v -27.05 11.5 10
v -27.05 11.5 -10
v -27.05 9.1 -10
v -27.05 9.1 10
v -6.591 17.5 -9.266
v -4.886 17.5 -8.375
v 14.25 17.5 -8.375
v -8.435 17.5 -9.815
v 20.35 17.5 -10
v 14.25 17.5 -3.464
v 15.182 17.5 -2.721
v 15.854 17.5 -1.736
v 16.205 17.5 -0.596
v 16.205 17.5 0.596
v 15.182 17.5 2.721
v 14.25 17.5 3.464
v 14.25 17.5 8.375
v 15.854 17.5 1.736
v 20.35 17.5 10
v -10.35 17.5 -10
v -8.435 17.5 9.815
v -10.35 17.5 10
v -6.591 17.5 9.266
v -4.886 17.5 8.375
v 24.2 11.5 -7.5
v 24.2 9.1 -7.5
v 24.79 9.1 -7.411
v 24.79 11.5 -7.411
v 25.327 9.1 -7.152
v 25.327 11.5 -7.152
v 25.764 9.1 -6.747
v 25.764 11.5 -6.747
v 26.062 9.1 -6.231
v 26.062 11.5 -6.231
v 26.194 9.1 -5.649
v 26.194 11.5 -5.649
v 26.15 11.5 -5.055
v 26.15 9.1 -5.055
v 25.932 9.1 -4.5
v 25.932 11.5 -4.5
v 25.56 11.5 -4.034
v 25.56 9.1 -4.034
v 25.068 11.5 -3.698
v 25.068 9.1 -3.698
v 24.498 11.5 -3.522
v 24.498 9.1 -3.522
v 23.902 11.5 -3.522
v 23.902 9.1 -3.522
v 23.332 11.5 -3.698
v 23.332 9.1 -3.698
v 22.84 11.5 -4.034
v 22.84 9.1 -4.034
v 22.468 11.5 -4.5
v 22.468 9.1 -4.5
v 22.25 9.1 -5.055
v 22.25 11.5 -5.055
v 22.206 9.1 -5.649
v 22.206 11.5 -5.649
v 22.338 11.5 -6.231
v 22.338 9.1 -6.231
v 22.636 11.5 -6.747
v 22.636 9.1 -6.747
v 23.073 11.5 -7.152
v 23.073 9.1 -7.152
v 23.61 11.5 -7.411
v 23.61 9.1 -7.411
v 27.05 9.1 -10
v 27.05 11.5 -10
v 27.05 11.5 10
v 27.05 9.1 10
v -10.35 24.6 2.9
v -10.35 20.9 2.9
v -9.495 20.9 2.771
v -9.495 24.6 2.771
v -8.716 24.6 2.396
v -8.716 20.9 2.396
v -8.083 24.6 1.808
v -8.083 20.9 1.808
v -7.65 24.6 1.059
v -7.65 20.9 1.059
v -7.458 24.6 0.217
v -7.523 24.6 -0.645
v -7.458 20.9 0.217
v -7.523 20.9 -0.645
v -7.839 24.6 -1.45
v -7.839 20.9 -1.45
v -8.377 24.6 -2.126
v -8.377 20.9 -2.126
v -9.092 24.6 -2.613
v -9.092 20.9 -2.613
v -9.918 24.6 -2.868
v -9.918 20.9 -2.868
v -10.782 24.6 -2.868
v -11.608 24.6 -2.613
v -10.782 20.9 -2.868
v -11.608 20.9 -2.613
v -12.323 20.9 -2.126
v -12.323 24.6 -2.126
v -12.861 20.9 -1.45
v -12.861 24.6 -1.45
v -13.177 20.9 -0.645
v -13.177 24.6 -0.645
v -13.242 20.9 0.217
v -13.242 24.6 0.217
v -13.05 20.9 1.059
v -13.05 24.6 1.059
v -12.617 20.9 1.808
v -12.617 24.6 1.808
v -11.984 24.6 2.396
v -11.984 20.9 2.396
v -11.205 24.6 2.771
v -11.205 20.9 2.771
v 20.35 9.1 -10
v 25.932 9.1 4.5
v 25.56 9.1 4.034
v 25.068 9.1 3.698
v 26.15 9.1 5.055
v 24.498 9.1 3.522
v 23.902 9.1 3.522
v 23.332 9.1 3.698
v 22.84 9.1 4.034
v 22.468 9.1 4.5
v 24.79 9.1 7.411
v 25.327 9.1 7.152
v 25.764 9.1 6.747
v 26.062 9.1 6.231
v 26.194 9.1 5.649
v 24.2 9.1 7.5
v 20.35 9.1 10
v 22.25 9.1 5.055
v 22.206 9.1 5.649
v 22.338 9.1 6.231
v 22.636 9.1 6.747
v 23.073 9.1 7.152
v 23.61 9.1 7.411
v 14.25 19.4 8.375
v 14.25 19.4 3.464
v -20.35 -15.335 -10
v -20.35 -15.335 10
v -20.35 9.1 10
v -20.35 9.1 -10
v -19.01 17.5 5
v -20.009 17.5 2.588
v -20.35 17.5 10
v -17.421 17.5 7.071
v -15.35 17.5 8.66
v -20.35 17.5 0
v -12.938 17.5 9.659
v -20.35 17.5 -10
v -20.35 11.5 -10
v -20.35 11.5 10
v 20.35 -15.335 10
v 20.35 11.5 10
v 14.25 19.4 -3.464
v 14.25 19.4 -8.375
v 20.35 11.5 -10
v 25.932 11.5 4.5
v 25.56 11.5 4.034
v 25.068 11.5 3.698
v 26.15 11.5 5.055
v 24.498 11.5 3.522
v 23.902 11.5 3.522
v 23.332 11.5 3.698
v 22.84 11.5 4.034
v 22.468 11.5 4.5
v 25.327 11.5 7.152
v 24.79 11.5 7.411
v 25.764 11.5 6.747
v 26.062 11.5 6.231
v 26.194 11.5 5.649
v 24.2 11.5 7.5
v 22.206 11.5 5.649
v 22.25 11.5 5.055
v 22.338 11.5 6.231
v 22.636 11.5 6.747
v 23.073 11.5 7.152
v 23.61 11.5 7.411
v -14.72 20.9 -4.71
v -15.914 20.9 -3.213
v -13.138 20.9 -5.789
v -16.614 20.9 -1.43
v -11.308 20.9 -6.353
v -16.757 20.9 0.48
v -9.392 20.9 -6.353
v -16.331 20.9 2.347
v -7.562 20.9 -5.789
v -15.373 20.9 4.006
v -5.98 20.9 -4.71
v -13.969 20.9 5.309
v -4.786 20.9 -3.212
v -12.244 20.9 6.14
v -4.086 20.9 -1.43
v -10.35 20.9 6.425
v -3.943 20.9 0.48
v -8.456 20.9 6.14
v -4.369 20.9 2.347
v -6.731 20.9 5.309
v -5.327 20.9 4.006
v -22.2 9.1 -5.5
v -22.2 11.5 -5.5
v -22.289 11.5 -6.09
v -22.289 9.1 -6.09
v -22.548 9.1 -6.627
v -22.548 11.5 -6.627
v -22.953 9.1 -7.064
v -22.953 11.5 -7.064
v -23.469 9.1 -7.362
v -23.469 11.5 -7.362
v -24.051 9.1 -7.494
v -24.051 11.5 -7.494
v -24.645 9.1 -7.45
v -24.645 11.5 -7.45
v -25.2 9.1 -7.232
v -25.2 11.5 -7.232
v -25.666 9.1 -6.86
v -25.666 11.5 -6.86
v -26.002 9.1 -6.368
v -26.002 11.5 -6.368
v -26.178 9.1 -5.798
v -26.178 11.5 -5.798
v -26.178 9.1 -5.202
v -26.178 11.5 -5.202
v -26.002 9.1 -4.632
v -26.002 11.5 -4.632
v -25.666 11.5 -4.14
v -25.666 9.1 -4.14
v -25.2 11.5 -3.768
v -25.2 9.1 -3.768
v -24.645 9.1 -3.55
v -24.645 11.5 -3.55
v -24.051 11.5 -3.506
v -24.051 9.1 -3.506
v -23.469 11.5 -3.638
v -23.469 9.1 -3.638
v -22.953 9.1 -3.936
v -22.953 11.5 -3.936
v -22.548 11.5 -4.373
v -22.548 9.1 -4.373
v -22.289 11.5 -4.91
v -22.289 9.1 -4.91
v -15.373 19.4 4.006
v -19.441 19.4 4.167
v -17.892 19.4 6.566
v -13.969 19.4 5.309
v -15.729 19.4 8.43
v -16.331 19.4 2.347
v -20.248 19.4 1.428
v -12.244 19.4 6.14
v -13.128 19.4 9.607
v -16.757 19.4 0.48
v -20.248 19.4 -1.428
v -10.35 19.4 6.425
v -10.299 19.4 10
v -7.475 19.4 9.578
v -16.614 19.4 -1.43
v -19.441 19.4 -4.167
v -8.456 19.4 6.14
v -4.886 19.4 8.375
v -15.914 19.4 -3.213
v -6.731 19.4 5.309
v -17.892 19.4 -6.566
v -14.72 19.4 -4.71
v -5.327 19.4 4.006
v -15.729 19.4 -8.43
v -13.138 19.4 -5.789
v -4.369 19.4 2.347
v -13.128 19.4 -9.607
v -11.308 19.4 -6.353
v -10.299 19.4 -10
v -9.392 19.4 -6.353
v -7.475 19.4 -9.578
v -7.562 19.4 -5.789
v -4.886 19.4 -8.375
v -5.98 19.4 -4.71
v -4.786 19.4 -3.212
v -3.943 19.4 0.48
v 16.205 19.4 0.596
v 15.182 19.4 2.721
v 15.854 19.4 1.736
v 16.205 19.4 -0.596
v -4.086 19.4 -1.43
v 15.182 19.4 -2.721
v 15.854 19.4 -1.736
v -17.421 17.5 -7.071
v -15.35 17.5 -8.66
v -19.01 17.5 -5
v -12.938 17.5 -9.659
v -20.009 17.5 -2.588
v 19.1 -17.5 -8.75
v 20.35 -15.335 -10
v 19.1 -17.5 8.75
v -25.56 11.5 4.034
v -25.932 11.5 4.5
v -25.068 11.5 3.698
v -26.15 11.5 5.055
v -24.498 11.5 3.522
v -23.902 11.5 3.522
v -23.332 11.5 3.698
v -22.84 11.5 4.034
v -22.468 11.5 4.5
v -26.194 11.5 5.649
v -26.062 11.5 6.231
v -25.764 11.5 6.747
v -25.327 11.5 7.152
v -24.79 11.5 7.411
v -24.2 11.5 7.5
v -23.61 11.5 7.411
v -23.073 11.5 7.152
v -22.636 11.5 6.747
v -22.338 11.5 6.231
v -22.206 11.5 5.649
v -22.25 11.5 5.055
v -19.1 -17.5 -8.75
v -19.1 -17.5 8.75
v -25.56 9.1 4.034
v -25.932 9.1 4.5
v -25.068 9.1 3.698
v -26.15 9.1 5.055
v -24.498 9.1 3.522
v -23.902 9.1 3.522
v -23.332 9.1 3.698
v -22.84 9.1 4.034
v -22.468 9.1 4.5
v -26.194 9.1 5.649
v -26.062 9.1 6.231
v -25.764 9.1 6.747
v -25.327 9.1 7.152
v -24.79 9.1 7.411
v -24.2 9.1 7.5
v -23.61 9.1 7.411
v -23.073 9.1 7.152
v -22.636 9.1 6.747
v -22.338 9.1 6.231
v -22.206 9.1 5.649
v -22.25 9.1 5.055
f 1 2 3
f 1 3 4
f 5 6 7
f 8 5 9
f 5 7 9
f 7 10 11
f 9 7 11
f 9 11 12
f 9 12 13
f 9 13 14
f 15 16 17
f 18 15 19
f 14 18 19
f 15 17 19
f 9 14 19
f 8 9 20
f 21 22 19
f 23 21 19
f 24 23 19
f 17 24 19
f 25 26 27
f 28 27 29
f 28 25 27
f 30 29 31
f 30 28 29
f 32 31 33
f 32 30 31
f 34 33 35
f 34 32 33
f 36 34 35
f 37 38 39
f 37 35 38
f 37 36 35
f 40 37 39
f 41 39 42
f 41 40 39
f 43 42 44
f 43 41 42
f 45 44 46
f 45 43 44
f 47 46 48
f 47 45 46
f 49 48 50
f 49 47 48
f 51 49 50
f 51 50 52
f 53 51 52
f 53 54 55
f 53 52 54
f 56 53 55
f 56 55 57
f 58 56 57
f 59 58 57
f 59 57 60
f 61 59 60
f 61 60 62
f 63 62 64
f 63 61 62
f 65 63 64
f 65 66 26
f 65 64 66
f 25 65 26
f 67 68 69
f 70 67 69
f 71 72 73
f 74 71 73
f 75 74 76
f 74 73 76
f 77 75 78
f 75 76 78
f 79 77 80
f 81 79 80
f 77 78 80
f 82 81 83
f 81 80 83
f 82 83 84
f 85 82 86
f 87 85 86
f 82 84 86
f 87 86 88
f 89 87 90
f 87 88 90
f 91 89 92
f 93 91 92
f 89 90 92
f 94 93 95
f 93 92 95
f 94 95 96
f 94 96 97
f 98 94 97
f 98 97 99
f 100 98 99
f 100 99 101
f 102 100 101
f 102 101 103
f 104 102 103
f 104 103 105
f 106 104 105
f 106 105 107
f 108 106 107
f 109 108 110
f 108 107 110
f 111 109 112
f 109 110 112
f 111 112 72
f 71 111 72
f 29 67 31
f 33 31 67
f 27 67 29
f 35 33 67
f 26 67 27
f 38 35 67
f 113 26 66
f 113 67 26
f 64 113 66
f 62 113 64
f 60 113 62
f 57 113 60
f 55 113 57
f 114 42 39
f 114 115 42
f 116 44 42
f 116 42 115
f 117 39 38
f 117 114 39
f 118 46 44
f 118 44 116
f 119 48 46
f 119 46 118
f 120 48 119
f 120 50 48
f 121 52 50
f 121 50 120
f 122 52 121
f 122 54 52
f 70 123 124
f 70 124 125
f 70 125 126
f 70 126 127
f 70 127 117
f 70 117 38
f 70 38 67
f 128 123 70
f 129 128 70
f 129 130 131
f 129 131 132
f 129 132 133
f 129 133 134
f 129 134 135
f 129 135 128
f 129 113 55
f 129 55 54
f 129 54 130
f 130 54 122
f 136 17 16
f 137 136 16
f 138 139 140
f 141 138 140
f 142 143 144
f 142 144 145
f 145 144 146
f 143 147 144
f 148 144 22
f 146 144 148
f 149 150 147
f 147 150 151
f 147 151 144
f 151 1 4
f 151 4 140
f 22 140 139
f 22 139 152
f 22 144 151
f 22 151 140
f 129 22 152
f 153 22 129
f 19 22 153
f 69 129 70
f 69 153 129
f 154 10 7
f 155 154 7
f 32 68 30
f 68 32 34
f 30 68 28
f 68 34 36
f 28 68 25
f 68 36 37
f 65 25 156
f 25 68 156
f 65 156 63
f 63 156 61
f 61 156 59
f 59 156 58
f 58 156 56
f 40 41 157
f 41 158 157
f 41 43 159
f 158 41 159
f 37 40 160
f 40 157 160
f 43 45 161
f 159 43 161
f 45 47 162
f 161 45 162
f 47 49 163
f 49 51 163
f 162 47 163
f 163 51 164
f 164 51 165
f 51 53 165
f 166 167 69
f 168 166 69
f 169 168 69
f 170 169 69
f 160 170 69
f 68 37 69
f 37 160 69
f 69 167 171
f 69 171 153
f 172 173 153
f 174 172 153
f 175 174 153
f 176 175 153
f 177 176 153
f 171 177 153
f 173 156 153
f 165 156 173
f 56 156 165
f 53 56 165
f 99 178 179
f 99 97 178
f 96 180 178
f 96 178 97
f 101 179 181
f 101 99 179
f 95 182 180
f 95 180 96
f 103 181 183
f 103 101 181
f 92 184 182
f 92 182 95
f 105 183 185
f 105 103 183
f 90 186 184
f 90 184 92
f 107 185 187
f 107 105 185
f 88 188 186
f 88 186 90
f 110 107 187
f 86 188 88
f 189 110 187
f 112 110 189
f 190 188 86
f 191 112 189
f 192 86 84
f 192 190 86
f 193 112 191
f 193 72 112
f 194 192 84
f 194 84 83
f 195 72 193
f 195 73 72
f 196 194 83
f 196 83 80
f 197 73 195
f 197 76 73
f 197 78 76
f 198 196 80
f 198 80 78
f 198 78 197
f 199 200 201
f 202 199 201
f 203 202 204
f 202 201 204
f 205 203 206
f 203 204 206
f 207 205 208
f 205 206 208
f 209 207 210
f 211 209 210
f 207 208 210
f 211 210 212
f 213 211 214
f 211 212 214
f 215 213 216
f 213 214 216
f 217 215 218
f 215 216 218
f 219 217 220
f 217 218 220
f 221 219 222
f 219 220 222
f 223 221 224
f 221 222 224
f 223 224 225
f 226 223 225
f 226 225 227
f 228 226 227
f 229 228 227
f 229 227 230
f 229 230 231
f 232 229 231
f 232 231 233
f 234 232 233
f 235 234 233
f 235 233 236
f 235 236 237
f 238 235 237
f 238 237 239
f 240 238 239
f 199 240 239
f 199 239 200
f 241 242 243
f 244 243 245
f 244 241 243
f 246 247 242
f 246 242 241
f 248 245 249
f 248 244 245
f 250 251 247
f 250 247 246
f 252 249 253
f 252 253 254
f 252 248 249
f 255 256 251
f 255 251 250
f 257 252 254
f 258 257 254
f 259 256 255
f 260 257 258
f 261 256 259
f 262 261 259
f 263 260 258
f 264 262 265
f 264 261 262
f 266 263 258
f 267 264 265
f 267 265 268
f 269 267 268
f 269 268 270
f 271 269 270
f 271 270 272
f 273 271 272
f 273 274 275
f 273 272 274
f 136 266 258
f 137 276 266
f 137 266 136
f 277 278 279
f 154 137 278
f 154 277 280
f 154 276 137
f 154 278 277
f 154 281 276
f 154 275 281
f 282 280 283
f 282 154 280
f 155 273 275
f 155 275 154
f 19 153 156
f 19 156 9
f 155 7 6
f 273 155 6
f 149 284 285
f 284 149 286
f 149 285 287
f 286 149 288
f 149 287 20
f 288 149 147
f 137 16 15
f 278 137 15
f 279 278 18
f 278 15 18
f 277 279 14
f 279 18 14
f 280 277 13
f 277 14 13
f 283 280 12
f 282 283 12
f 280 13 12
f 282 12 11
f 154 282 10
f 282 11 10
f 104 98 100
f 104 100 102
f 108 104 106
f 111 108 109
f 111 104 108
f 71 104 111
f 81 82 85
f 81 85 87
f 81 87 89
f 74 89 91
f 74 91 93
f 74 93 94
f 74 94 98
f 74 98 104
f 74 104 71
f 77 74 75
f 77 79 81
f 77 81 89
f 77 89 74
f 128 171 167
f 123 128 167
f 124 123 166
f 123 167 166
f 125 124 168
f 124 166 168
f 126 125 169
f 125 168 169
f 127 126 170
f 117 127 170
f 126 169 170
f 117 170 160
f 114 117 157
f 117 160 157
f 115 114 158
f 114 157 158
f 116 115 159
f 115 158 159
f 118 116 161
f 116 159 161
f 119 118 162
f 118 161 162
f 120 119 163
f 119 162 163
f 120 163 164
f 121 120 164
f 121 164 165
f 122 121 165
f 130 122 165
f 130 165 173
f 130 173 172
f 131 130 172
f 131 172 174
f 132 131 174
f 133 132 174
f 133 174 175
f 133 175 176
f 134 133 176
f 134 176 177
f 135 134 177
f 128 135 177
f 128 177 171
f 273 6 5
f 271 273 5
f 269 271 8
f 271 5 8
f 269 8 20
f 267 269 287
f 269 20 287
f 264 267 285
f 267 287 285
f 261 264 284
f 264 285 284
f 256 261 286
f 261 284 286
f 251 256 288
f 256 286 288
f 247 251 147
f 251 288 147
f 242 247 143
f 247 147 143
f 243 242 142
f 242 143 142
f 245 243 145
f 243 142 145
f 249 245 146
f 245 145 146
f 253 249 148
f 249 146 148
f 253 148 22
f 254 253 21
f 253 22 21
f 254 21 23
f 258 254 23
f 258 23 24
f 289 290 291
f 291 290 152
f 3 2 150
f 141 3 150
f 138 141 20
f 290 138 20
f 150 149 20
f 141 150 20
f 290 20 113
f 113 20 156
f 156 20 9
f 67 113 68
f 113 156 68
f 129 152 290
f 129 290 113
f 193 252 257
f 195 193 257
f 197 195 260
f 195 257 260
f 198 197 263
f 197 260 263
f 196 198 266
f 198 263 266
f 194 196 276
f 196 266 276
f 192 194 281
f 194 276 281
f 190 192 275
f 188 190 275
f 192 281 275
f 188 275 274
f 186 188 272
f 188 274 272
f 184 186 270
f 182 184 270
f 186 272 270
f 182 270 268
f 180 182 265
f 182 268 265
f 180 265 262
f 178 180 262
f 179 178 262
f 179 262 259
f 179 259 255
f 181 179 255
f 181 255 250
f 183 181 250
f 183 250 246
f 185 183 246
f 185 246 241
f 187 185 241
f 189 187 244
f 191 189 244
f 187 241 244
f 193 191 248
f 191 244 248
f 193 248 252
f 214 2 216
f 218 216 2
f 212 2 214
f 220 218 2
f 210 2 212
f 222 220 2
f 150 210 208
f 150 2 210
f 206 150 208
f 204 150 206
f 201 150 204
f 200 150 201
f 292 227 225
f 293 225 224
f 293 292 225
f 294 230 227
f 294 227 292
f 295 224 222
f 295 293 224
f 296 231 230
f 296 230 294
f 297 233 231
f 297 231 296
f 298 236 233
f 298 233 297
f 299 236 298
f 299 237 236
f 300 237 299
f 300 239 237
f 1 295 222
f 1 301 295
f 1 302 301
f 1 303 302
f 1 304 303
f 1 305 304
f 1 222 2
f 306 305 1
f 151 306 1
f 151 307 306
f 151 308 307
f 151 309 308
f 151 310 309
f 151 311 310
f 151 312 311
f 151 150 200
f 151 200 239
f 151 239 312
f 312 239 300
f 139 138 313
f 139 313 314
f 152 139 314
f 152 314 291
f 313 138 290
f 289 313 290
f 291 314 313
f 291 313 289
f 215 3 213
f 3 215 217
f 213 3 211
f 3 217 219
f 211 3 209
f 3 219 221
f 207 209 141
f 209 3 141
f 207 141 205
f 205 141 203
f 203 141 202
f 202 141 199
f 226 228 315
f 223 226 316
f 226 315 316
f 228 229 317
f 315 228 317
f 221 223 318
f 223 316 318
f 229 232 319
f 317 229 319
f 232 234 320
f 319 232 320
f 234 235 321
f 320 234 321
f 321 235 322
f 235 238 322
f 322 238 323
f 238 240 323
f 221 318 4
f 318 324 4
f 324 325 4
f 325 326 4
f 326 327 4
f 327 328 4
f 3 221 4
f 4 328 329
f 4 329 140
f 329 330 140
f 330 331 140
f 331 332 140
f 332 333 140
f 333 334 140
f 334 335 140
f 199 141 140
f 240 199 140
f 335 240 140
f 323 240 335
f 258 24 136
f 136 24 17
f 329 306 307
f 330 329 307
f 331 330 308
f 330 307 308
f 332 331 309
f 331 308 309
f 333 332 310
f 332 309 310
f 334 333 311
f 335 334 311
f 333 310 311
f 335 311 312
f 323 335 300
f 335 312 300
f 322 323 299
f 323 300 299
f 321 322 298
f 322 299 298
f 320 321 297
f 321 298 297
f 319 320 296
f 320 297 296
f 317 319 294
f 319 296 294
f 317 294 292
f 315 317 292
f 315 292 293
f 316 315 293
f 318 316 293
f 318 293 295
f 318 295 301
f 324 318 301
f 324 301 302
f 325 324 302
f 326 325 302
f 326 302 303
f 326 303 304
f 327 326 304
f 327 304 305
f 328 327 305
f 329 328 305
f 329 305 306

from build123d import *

# Parameters (mm, degrees)
ESQUISSE1_W                = 40.7
ESQUISSE1_H                = 35
EXTRUSION1_DEPTH           = 10
ESQUISSE2_W                = 20
ESQUISSE2_H                = 2.4
EXTRUSION2_DEPTH           = 6.7
CHANFREIN1_SIZE            = 1.25
CHANFREIN1_SIZE2           = 2.165063509
EXTRUSION3_DEPTH           = 1.9
ESQUISSE4_R                = 6.425
EXTRUSION4_DEPTH           = 1.5
ESQUISSE5_R                = 2
EXTRUSION5_DEPTH           = 10
R_P_TITION_LIN_AIRE1_COUNT = 2
R_P_TITION_LIN_AIRE1_PITCH = 48.4
SYM_TRIE2_COPY_1_SKETCH_R  = 2
SYM_TRIE2_COPY_1_DEPTH     = 10
ESQUISSE6_R                = 2.9
EXTRUSION6_DEPTH           = 3.7


with BuildPart() as part:
    # Esquisse1 → Extrusion1 (new, symmetric)
    with BuildSketch(Plane.XY):
        Rectangle(ESQUISSE1_W, ESQUISSE1_H)
    extrude(amount=EXTRUSION1_DEPTH, both=True)

    # Esquisse2 → Extrusion2 (add)
    with BuildSketch(Plane.ZY.offset(20.35)):
        with Locations((0, 10.3)):
            Rectangle(ESQUISSE2_W, ESQUISSE2_H)
    extrusion2 = extrude(amount=EXTRUSION2_DEPTH)

    # Symétrie1: Extrusion2 across plane
    add(extrusion2.mirror(Plane(origin=(0, 0, 0), x_dir=(0, 0, 1), z_dir=(1, 0, 0))))

    # Chanfrein1
    chanfrein1_edges = [part.edges().sort_by_distance(p)[0] for p in [
        (-20.35, -17.5, 0),
        (0, -17.5, -10),
        (20.35, -17.5, 0),
        (0, -17.5, 10),
    ]]
    chanfrein1_side = [part.faces().sort_by_distance(p)[0] for p in [
        (0, -17.5, 0),
    ]]
    chamfer(chanfrein1_edges, length=CHANFREIN1_SIZE, length2=CHANFREIN1_SIZE2, reference=chanfrein1_side[0])

    # Esquisse3 → Extrusion3 (add)
    with BuildSketch(Plane(origin=(0, 17.5, 0), x_dir=(1, 0, 0), z_dir=(0, 1, 0))):
        with BuildLine():
            Line((-4.885626751, -8.375), (14.25, -8.375))
            Line((14.25, -8.375), (14.25, -3.464101615))
            ThreePointArc((14.25, -3.464101615), (16.25, 0), (14.25, 3.464101615))
            Line((14.25, 3.464101615), (14.25, 8.375))
            Line((14.25, 8.375), (-4.885626751, 8.375))
            ThreePointArc((-4.885626751, 8.375), (-20.35, 0), (-4.885626751, -8.375))
        make_face()
    extrude(amount=EXTRUSION3_DEPTH)

    # Esquisse4 → Extrusion4 (add)
    with BuildSketch(Plane(origin=(0, 19.4, 0), x_dir=(1, 0, 0), z_dir=(0, 1, 0))):
        with Locations(Location((-10.35, 0, 0), (0, 0, 270))):
            Circle(ESQUISSE4_R)
    extrude(amount=EXTRUSION4_DEPTH)

    # Esquisse5 → Extrusion5 (cut)
    with BuildSketch(Plane(origin=(0, 11.5, 0), x_dir=(1, 0, 0), z_dir=(0, 1, 0))):
        with Locations(Location((24.2, -5.5, 0), (0, 0, 270))):
            Circle(ESQUISSE5_R)
    extrusion5 = extrude(amount=-EXTRUSION5_DEPTH, mode=Mode.SUBTRACT)

    # Répétition linéaire1: Extrusion5 ×2
    with Locations(*[(-i * R_P_TITION_LIN_AIRE1_PITCH, 0, 0) for i in range(1, R_P_TITION_LIN_AIRE1_COUNT)]):
        add(extrusion5, mode=Mode.SUBTRACT)

    # Symétrie2: Extrusion5 across plane
    add(extrusion5.mirror(Plane.XY), mode=Mode.SUBTRACT)

    # Symétrie2 copy 1 sketch → Symétrie2 copy 1 (cut)
    with BuildSketch(Plane(origin=(-48.4, 11.5, 0), x_dir=(1, 0, 0), z_dir=(0, 1, 0))):
        with Locations((24.2, 5.5)):
            Circle(SYM_TRIE2_COPY_1_SKETCH_R)
    extrude(amount=-SYM_TRIE2_COPY_1_DEPTH, mode=Mode.SUBTRACT)

    # Esquisse6 → Extrusion6 (add)
    with BuildSketch(Plane(origin=(0, 20.9, 0), x_dir=(1, 0, 0), z_dir=(0, 1, 0))):
        with Locations(Location((-10.35, 0, 0), (0, 0, 270))):
            Circle(ESQUISSE6_R)
    extrude(amount=EXTRUSION6_DEPTH)


solid = part.part
